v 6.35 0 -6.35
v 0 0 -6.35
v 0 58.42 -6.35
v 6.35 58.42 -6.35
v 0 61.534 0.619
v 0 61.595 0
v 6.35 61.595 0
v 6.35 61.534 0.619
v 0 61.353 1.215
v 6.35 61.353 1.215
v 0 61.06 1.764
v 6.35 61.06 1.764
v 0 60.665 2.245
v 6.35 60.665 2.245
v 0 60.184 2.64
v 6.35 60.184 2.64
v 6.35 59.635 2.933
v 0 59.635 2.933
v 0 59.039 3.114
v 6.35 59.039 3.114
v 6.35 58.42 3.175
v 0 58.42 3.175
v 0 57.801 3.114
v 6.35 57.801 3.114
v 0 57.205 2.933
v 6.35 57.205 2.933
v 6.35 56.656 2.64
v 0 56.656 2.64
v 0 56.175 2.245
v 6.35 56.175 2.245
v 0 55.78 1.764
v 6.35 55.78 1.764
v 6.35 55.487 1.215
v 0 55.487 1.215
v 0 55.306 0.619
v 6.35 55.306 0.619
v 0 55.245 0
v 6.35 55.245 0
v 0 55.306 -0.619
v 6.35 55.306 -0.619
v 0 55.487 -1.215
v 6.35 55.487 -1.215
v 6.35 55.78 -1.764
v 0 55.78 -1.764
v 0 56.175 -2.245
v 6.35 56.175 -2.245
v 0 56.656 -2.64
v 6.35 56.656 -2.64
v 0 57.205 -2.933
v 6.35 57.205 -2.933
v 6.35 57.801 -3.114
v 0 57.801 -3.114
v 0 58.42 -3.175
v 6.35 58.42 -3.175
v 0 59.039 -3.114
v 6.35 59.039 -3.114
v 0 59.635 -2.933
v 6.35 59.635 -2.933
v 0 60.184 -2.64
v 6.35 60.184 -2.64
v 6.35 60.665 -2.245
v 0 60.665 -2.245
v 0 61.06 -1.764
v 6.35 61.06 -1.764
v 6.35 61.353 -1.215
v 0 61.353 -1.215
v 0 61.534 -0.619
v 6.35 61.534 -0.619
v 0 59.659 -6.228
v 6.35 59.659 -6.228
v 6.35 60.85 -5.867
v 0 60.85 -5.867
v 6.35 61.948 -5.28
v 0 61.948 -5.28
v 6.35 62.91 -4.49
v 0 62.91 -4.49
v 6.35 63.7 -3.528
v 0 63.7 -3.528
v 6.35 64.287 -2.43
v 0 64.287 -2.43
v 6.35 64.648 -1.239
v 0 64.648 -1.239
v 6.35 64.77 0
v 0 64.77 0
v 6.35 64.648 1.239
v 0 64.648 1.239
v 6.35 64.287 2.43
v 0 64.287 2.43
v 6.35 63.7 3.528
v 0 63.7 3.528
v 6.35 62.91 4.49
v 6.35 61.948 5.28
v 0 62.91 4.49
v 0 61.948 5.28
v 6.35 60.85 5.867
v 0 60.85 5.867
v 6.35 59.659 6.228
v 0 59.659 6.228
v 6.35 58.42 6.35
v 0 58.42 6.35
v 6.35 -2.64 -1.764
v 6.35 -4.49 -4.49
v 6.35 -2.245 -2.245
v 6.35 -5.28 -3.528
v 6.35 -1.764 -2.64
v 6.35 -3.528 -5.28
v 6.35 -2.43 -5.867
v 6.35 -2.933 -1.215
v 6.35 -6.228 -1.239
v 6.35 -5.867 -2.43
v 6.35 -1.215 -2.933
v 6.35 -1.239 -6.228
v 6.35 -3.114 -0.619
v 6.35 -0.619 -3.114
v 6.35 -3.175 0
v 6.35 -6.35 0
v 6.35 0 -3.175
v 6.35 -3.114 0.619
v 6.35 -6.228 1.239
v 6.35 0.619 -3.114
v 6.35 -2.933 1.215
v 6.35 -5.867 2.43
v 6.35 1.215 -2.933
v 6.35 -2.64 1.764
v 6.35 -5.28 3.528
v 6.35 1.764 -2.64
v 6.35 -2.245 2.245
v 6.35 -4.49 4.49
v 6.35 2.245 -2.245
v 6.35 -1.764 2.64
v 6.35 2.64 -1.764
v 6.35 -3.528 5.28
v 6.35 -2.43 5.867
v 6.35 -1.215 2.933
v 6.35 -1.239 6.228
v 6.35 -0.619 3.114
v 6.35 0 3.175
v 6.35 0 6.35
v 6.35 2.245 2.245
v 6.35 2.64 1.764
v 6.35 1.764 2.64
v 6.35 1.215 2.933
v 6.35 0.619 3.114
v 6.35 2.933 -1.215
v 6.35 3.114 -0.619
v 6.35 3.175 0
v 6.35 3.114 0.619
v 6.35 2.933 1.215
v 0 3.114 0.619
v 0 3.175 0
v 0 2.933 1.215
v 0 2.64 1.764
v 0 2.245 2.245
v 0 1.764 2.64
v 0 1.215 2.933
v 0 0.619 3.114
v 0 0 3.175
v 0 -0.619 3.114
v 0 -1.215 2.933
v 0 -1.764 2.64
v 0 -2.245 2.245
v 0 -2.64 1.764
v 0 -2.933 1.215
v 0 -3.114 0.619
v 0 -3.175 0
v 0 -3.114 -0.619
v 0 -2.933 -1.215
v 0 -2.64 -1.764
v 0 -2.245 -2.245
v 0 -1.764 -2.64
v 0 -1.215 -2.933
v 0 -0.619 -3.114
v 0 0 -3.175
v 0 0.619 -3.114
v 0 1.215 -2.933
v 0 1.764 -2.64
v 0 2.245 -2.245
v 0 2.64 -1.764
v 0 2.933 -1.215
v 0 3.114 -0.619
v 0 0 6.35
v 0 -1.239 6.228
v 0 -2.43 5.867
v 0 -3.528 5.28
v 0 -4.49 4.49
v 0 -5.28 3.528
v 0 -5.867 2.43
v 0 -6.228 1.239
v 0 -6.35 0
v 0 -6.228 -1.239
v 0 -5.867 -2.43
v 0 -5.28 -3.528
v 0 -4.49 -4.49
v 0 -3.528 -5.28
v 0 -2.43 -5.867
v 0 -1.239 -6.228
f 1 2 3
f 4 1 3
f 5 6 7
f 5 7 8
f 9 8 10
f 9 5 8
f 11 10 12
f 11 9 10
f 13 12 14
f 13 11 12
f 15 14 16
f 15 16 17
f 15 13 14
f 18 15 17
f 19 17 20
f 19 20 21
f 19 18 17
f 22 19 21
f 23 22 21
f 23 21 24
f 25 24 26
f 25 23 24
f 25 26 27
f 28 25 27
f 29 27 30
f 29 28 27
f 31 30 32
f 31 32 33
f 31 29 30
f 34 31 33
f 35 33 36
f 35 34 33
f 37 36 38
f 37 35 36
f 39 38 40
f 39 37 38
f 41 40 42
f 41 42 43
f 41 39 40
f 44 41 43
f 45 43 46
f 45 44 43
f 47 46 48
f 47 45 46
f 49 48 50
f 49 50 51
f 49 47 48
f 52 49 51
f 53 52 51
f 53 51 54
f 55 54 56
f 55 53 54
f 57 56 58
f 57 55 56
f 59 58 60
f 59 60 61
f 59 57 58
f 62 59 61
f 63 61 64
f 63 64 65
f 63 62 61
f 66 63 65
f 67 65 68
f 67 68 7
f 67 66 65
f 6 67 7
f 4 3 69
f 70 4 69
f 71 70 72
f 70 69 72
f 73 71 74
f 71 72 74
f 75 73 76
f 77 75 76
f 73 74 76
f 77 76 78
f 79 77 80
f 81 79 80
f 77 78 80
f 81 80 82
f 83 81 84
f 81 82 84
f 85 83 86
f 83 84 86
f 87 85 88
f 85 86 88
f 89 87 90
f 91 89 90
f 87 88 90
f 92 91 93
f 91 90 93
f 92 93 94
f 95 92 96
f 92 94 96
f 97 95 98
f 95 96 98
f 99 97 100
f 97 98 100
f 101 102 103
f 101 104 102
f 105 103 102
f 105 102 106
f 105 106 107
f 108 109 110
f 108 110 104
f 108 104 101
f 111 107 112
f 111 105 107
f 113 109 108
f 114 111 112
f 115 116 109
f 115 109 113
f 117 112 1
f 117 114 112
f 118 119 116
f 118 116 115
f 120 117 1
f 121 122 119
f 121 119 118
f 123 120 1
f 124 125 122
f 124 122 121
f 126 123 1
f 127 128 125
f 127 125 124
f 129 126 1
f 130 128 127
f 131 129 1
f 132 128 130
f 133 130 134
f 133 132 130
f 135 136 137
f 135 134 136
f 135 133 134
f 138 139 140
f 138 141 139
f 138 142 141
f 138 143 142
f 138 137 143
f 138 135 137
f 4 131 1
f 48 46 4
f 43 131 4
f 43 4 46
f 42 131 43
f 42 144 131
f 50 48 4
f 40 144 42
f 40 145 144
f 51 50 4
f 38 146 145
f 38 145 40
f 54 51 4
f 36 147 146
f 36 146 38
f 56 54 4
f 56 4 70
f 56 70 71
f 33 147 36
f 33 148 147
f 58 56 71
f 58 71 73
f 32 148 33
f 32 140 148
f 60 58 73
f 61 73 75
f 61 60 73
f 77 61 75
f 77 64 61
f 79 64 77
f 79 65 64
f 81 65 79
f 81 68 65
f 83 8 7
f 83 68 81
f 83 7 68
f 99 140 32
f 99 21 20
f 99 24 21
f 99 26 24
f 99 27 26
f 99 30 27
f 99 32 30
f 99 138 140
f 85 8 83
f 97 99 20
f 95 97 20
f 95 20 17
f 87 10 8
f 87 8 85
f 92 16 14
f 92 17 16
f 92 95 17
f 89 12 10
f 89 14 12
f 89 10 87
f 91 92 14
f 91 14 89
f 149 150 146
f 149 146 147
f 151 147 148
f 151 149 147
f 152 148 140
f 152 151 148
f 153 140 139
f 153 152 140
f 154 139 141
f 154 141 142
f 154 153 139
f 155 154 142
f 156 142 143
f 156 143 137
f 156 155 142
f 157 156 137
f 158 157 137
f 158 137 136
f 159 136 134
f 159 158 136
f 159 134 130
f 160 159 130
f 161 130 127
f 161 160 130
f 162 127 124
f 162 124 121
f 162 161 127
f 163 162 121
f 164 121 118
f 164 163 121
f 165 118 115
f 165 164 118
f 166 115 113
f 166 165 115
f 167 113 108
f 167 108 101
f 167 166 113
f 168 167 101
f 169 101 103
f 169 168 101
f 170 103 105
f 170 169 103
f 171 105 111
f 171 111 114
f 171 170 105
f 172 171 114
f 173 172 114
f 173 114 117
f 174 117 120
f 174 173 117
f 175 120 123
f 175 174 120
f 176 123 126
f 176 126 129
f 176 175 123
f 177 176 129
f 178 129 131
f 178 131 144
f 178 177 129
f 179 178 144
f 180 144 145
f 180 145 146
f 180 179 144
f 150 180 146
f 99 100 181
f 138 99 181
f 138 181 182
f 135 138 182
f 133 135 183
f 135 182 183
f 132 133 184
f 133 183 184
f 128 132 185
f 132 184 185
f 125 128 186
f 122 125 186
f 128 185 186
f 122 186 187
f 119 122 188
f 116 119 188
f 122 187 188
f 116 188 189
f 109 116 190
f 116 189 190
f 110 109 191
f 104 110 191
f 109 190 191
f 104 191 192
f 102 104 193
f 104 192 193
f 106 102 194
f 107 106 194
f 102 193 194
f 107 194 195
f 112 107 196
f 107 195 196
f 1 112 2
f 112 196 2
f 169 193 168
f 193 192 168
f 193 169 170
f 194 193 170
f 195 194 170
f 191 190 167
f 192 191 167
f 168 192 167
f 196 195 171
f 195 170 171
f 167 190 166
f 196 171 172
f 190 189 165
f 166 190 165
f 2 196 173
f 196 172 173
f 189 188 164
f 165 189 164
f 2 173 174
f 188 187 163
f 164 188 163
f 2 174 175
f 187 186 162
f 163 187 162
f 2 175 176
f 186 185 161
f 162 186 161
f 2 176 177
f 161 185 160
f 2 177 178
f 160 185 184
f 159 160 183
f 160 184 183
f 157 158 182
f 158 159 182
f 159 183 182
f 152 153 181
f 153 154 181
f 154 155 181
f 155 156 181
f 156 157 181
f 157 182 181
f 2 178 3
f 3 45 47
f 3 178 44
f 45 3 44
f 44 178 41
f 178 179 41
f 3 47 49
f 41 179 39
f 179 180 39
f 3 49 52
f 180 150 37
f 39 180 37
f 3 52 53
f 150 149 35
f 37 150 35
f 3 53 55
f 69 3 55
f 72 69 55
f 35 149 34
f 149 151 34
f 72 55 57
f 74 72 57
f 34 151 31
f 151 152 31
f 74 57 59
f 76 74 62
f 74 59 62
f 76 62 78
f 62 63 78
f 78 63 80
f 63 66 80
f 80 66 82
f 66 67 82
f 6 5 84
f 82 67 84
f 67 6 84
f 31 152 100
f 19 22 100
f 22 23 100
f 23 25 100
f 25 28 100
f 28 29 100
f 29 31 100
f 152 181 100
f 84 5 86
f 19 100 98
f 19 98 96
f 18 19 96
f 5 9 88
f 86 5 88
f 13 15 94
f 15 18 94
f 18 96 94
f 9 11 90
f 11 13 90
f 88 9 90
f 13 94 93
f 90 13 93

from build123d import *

# Parameters (mm, degrees)
F0_R     = 3.175
F1_DEPTH = 6.35


with BuildPart() as f1:
    # F0 (on Right) → F1 (new body)
    with BuildSketch(Plane.YZ):
        with BuildLine():
            Line((58.42, 6.35), (0, 6.35))
            ThreePointArc((0, 6.35), (-6.35, 0), (0, -6.35))
            Line((0, -6.35), (58.42, -6.35))
            ThreePointArc((58.42, -6.35), (64.77, 0), (58.42, 6.35))
        make_face()
        Circle(F0_R, mode=Mode.SUBTRACT)
        with Locations((58.42, 0)):
            Circle(F0_R, mode=Mode.SUBTRACT)
    extrude(amount=F1_DEPTH)


solid = f1.part
